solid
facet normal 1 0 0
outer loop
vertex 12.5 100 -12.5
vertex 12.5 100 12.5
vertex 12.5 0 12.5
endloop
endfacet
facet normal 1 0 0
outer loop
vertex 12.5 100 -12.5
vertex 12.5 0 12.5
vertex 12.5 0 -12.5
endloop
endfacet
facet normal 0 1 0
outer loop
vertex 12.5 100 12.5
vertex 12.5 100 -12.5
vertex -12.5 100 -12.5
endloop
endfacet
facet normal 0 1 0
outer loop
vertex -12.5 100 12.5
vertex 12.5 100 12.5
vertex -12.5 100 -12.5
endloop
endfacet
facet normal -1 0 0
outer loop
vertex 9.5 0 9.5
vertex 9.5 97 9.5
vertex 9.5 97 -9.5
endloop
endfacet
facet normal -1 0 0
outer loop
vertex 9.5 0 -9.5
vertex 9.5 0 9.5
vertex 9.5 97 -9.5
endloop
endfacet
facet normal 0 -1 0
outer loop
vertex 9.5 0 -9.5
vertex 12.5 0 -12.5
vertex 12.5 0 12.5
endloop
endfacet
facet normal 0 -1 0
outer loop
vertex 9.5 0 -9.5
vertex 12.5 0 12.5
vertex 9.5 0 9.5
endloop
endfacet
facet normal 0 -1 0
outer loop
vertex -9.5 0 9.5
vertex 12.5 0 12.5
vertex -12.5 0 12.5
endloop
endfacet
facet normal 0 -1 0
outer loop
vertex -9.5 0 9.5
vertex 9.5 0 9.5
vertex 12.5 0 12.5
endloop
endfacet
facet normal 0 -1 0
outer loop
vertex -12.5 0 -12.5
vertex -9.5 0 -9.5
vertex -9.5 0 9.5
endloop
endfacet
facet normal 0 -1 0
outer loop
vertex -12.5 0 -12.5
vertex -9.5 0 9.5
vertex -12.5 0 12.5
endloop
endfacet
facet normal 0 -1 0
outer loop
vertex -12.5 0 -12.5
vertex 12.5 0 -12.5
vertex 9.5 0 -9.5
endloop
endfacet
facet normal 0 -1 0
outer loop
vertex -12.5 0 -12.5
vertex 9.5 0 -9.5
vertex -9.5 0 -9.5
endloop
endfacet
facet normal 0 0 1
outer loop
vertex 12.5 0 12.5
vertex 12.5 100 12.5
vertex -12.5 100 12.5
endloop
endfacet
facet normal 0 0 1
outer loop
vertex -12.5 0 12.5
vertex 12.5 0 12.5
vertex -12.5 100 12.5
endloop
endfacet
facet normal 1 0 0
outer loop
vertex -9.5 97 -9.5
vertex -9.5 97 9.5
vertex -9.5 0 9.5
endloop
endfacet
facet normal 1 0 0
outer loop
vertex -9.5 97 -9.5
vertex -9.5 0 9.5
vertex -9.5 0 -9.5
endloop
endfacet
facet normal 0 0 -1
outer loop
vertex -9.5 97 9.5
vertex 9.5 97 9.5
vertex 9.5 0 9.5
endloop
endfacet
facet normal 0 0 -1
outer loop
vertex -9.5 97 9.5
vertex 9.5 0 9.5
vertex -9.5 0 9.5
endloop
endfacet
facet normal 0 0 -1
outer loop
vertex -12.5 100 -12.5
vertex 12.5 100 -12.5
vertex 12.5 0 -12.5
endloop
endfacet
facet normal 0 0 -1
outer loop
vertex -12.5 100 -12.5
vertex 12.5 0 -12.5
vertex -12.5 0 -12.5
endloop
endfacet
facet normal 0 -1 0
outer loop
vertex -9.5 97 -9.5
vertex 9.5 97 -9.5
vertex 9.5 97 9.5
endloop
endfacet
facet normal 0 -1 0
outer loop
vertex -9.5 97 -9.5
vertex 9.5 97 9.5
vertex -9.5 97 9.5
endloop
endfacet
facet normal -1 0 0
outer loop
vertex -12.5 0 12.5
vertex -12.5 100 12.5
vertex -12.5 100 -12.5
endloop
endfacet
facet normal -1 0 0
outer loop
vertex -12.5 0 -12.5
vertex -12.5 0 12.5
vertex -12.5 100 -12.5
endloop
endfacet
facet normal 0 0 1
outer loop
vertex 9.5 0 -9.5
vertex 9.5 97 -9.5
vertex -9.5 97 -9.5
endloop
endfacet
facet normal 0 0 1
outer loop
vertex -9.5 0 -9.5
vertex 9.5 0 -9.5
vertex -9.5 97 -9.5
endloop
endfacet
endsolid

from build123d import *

# Parameters (mm, degrees)
SKETCH2_W             = 25
SKETCH2_H             = 25
BOSS_EXTRUDE2_DEPTH   = 100
SHELL2_T              = -3
BODY_MOVE_COPY1_ANGLE = 180


with BuildPart() as part:
    # Sketch2 → Boss-Extrude2 (new body)
    with BuildSketch(Plane(origin=(0, 0, 0), x_dir=(1, 0, 0), z_dir=(0, 1, 0))):
        Rectangle(SKETCH2_W, SKETCH2_H)
    extrude(amount=BOSS_EXTRUDE2_DEPTH)

    # Shell2
    shell2_openings = [part.faces().sort_by_distance(p)[0] for p in [
        (0, 100, 0),
    ]]
    offset(amount=SHELL2_T, openings=shell2_openings, kind=Kind.INTERSECTION)


with BuildPart() as part_1:
    # Body-Move/Copy1: moved
    add(part.part.rotate(Axis((0, 50, 0), (0, 0, 1)), BODY_MOVE_COPY1_ANGLE))


solid = part_1.part
